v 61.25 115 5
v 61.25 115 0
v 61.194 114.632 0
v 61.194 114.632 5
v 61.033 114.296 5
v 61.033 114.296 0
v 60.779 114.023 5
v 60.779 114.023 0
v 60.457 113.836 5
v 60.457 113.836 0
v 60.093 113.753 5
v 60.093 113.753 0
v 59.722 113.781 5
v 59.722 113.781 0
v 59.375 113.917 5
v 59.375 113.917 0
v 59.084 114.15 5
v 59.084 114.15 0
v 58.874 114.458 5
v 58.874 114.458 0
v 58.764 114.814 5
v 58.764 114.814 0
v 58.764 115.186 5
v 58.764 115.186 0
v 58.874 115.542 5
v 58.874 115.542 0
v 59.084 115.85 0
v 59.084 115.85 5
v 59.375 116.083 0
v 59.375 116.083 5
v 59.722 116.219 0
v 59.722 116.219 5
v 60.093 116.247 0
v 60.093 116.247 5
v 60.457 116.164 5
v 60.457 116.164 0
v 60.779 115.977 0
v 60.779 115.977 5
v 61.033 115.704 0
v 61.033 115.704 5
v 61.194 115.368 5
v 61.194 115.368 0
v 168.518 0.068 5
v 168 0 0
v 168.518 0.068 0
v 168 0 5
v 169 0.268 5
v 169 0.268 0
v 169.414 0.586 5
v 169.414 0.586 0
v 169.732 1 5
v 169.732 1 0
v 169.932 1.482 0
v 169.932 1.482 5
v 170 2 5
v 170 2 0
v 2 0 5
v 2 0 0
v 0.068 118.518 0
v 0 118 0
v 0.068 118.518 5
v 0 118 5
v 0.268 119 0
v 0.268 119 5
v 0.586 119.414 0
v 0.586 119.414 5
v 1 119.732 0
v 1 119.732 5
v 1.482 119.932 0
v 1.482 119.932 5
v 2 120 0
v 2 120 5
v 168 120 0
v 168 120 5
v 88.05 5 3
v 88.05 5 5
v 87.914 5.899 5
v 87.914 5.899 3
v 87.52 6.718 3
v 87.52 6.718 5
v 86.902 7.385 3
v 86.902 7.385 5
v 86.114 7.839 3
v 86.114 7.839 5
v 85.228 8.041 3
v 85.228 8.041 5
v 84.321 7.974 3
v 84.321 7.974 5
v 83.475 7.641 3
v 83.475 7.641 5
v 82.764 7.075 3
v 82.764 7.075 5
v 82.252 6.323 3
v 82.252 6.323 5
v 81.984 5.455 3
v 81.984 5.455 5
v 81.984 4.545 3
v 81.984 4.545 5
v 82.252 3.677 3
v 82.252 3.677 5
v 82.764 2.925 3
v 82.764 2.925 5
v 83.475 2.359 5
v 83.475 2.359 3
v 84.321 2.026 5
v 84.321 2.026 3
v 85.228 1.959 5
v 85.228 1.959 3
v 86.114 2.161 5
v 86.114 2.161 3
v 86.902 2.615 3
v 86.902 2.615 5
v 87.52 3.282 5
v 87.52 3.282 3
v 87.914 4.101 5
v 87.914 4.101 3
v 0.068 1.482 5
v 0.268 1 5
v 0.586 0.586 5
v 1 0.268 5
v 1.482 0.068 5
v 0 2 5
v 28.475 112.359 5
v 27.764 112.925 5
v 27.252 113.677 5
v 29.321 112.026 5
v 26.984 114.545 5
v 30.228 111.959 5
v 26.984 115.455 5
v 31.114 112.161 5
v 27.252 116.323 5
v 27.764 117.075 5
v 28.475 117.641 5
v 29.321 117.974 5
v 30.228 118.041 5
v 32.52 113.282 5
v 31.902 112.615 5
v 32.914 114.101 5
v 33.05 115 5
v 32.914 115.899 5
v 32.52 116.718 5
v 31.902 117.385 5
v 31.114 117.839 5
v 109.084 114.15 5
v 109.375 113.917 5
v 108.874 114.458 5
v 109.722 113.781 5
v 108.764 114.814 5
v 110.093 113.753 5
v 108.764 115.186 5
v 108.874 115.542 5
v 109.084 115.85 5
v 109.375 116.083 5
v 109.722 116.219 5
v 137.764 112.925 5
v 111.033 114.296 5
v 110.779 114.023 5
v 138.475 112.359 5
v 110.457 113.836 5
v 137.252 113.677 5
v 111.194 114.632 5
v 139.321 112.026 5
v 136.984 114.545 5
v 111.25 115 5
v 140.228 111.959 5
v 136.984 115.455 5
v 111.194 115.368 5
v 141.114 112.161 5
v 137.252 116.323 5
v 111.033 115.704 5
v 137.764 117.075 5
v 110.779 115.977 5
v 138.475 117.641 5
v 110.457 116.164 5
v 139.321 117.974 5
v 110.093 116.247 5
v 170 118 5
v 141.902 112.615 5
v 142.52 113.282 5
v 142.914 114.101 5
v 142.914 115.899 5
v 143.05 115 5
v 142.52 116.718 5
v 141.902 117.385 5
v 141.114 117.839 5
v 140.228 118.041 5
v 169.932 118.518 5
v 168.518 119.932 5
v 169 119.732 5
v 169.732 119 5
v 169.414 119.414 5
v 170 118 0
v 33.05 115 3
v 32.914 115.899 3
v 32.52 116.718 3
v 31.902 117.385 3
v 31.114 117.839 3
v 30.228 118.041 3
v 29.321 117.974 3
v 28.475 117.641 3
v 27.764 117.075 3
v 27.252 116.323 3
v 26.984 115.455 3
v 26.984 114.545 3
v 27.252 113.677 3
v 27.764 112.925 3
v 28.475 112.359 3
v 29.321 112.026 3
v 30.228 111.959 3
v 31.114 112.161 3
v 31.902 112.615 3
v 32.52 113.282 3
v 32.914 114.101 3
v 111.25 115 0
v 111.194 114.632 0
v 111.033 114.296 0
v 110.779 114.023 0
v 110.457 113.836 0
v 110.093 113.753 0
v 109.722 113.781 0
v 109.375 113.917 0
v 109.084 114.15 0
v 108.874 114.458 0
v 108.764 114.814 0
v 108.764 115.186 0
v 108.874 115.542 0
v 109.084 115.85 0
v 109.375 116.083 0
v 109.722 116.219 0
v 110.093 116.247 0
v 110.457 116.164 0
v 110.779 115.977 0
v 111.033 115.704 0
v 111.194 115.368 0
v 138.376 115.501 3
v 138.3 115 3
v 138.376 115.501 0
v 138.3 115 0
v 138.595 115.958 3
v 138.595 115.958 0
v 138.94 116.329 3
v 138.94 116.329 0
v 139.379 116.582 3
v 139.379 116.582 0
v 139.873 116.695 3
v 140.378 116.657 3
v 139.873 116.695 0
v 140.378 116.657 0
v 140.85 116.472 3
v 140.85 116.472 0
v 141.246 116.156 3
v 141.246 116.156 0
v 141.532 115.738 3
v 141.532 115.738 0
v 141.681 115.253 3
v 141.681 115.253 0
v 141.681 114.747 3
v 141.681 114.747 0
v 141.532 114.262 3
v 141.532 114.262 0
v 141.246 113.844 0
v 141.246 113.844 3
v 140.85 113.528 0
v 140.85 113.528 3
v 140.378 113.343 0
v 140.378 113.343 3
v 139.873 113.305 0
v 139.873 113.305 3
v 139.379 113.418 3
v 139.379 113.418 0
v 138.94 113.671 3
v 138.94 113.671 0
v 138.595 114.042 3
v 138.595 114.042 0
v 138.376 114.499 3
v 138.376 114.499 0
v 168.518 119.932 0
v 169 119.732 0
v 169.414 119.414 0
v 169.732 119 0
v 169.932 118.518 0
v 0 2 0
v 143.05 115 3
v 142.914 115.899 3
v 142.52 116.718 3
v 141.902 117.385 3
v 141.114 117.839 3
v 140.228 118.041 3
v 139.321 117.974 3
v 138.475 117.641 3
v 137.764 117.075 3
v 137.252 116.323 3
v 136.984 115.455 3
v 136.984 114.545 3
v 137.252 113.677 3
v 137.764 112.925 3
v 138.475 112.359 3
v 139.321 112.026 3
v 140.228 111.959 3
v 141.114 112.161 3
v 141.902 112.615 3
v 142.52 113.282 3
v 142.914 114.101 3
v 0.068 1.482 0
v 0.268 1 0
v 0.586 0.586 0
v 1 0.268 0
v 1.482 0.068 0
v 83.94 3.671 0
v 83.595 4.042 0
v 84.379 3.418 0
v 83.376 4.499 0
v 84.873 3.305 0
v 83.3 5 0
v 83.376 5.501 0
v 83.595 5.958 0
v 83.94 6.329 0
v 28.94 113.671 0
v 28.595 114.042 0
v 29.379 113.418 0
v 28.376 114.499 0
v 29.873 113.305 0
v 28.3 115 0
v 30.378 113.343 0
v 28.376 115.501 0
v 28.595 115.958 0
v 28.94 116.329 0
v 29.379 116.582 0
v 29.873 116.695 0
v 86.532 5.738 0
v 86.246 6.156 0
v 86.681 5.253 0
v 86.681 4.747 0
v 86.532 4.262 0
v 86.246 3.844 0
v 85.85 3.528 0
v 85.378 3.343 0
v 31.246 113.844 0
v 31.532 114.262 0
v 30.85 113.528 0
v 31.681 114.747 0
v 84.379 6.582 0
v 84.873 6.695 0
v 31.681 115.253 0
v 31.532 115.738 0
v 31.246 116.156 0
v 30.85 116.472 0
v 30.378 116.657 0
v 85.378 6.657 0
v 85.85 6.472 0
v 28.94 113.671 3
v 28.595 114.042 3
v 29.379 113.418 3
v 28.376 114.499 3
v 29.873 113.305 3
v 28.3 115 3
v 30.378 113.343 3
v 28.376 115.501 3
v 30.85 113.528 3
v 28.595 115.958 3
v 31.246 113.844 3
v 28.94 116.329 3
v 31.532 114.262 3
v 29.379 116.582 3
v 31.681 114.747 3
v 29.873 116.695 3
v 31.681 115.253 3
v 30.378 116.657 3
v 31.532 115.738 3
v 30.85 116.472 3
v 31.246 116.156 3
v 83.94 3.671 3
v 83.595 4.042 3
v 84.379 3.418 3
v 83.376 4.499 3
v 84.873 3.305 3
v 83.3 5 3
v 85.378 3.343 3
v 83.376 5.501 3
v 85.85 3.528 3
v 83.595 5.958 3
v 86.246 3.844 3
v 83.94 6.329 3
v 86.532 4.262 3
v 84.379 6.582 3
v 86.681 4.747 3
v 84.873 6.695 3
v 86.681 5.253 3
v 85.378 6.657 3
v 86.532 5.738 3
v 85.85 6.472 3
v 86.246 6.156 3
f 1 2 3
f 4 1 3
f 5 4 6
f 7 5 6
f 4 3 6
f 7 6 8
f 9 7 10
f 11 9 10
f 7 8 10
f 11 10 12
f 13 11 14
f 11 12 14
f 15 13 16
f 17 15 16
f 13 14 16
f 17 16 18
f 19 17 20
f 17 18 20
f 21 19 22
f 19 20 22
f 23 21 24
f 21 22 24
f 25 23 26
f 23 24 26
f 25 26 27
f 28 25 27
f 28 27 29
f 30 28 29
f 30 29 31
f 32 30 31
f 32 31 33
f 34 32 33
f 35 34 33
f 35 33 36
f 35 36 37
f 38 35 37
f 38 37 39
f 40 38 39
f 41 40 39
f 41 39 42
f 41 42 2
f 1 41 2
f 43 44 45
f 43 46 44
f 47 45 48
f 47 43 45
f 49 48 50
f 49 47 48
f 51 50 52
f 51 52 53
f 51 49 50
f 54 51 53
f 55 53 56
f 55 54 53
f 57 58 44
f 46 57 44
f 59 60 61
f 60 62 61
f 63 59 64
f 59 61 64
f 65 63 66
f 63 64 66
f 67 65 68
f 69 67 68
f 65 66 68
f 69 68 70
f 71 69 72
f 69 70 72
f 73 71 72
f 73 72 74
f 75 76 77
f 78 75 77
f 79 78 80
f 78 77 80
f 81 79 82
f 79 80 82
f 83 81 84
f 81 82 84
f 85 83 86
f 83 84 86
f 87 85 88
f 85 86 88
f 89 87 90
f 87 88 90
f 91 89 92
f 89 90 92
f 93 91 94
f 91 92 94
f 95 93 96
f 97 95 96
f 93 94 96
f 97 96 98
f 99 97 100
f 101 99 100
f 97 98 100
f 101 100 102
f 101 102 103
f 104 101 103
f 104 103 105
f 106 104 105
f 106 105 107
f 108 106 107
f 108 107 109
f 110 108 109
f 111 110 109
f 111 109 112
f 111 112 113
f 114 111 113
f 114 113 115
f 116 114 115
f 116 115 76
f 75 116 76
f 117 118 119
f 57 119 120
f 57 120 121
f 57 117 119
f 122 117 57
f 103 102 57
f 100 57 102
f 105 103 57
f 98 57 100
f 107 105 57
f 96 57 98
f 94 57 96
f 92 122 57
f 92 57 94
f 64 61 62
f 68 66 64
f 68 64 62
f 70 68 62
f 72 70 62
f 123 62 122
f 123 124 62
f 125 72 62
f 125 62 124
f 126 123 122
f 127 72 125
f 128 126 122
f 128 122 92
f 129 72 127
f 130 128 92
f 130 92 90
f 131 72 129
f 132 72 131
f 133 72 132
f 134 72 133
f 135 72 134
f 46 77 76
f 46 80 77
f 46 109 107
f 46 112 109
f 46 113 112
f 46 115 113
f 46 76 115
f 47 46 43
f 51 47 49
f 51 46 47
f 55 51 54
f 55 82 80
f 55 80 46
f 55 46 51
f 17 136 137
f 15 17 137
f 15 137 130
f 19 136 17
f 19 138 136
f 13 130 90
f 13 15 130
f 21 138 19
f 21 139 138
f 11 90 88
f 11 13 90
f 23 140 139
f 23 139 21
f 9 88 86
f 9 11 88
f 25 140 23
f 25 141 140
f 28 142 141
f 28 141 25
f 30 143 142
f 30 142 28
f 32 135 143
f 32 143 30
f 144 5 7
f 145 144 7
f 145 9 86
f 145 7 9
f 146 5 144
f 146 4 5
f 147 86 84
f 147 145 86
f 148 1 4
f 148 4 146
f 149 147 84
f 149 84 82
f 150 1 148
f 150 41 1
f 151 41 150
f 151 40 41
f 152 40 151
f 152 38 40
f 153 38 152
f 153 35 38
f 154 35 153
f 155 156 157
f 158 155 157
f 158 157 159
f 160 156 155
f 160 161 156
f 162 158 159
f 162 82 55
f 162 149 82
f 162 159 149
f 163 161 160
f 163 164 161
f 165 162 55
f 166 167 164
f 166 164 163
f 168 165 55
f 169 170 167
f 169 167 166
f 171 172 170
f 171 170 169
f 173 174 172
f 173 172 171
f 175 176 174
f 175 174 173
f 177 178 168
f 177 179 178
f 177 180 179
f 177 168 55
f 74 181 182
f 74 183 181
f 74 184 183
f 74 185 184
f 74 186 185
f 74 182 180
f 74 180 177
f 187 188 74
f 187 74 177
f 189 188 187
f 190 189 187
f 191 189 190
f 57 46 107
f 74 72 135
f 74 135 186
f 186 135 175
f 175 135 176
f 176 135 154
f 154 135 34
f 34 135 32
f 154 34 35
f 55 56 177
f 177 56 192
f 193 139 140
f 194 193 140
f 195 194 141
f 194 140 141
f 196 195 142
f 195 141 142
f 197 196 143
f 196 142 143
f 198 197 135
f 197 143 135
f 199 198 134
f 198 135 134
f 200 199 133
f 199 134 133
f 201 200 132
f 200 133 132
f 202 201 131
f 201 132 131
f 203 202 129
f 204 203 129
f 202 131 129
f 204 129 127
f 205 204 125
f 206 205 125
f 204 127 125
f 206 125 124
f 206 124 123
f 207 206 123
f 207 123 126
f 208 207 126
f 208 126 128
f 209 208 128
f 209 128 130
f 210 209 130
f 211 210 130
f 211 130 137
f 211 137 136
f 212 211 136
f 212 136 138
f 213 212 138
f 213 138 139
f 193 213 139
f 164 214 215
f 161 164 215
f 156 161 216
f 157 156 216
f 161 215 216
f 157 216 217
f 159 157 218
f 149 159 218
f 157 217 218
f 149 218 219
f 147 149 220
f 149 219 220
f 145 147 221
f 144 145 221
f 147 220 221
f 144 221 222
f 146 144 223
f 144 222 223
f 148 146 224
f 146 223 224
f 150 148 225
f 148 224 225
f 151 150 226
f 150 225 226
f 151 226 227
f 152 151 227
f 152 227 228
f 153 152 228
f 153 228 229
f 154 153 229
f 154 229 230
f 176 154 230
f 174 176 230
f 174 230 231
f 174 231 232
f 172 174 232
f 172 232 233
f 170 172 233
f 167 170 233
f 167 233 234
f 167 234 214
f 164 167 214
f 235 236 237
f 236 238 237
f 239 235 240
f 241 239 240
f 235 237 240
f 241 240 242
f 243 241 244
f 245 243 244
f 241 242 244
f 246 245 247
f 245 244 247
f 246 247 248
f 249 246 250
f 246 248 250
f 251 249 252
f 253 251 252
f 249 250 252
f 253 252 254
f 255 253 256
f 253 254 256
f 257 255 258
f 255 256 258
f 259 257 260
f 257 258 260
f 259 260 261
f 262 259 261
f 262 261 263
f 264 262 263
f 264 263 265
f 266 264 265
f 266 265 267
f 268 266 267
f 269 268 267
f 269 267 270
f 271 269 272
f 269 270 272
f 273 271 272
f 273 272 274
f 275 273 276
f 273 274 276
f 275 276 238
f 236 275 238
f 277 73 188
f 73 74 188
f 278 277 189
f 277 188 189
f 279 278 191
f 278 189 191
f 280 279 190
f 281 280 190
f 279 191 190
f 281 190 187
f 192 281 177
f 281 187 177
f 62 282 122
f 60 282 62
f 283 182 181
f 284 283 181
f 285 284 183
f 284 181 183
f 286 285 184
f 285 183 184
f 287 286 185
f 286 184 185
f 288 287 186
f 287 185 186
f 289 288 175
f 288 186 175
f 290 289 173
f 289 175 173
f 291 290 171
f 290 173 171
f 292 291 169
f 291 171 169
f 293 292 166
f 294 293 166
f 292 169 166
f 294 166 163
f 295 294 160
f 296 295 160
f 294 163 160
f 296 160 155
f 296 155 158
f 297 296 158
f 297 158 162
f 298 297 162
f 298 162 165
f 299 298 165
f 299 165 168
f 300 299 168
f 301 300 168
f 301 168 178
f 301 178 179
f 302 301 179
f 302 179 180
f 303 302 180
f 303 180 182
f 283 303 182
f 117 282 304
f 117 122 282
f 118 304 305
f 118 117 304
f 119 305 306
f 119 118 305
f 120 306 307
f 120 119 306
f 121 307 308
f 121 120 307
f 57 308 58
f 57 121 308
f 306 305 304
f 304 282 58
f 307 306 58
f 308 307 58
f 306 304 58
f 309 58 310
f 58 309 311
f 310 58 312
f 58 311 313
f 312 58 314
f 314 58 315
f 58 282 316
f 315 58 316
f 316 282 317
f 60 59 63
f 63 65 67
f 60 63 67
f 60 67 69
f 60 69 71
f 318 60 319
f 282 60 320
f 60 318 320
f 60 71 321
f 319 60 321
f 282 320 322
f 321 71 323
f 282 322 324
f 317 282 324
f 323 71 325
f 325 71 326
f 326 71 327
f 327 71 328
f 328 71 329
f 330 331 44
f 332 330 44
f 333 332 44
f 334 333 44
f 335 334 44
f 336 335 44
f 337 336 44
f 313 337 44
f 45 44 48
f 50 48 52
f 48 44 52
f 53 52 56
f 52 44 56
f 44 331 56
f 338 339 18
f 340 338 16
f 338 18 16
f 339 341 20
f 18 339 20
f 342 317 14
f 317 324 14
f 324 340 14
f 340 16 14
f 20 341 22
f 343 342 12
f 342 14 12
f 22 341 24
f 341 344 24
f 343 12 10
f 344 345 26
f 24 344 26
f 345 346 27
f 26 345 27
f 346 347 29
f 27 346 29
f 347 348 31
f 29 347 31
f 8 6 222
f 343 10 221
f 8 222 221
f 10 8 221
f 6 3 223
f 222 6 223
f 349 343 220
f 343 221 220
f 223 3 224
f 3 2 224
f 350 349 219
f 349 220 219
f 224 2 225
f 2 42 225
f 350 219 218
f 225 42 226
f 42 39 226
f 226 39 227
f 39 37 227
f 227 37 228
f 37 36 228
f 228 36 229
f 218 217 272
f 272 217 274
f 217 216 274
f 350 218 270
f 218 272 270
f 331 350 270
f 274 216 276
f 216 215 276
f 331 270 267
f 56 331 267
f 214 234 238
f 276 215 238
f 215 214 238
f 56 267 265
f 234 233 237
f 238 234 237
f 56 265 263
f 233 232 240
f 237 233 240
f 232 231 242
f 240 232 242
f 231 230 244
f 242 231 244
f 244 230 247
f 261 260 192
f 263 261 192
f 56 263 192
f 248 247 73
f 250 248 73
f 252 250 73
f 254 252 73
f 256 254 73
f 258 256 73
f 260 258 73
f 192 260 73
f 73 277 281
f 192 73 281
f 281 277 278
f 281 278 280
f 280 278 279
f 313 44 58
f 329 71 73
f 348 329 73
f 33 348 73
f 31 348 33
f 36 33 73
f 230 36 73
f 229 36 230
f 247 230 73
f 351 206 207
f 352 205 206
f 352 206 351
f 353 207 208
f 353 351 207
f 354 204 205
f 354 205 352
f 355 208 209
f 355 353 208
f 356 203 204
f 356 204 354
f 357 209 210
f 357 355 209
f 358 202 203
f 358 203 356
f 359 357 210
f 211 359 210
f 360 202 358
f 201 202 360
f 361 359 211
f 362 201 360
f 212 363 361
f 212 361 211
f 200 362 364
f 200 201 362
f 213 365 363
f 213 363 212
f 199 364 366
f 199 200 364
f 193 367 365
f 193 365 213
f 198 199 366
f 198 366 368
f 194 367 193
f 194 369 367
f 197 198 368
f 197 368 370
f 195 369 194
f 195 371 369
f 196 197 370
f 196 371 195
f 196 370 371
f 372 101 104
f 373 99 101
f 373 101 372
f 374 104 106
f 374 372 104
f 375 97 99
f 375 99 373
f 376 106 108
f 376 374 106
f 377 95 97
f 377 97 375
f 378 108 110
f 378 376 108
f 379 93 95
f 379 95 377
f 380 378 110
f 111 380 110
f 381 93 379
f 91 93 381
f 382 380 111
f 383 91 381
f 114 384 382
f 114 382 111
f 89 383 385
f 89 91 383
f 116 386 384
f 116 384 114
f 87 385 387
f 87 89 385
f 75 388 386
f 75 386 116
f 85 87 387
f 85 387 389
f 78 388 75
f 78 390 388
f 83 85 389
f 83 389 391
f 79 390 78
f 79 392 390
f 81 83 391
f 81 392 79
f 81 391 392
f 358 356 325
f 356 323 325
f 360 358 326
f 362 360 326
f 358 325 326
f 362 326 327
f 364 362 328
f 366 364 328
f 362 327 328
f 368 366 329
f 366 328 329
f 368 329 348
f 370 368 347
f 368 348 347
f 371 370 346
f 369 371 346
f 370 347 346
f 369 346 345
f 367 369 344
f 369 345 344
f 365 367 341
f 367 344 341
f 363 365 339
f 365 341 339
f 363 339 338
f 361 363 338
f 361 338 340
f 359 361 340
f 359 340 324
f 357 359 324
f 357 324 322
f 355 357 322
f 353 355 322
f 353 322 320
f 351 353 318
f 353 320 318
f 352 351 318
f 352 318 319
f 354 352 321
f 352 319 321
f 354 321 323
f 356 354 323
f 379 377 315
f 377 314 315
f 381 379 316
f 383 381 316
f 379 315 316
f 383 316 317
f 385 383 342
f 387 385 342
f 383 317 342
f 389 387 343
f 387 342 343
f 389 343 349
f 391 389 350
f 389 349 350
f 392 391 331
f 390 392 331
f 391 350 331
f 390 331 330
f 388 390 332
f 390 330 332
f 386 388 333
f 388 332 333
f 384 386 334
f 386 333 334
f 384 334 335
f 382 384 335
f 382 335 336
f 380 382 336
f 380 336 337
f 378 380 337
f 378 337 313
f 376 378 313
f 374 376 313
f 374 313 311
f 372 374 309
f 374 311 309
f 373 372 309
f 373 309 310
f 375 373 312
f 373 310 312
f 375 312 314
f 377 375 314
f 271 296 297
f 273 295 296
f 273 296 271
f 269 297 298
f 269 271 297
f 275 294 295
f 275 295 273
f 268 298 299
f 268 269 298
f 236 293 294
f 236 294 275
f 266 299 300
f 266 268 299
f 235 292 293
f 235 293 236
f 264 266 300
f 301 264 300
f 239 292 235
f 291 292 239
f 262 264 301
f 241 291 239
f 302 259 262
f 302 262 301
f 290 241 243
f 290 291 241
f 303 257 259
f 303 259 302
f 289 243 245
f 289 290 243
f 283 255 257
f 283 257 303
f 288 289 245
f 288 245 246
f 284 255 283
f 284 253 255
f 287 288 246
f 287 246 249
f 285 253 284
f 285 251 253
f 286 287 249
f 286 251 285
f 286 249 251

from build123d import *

# Parameters (mm, degrees)
BOX_W            = 170
BOX_H            = 120
BOX_DEPTH        = 5
HOLE_D           = 3.4
HOLE_DEPTH       = 25
HOLE_CBORE_D     = 6.1
HOLE_CBORE_DEPTH = 2
SKETCH001_R      = 1.25
HOLE001_DEPTH    = 5.001
FILLET_R         = 2


with BuildPart() as part:
    # Box → Box (join)
    with BuildSketch(Plane.XY):
        with Locations((85, 60)):
            Rectangle(BOX_W, BOX_H)
    extrude(amount=BOX_DEPTH)

    # Hole
    with Locations(Plane.XY.offset(5)):
        with Locations((30, 115), (140, 115), (85, 5)):
            CounterBoreHole(HOLE_D / 2, HOLE_CBORE_D / 2, HOLE_CBORE_DEPTH, depth=HOLE_DEPTH)

    # Sketch001 (on Face5 of Hole) → Hole001 (cut, through all)
    with BuildSketch(Plane(origin=(0, 0, 0), x_dir=(1, 0, 0), z_dir=(0, 0, -1))):
        with Locations((60, -115)):
            Circle(SKETCH001_R)
        with Locations((110, -115)):
            Circle(SKETCH001_R)
    extrude(amount=-HOLE001_DEPTH, mode=Mode.SUBTRACT)

    # Fillet
    fillet_edges = [part.edges().sort_by_distance(p)[0] for p in [
        (0, 120, 2.5),
        (170, 0, 2.5),
        (0, 0, 2.5),
        (170, 120, 2.5),
    ]]
    fillet(fillet_edges, radius=FILLET_R)


solid = part.part
